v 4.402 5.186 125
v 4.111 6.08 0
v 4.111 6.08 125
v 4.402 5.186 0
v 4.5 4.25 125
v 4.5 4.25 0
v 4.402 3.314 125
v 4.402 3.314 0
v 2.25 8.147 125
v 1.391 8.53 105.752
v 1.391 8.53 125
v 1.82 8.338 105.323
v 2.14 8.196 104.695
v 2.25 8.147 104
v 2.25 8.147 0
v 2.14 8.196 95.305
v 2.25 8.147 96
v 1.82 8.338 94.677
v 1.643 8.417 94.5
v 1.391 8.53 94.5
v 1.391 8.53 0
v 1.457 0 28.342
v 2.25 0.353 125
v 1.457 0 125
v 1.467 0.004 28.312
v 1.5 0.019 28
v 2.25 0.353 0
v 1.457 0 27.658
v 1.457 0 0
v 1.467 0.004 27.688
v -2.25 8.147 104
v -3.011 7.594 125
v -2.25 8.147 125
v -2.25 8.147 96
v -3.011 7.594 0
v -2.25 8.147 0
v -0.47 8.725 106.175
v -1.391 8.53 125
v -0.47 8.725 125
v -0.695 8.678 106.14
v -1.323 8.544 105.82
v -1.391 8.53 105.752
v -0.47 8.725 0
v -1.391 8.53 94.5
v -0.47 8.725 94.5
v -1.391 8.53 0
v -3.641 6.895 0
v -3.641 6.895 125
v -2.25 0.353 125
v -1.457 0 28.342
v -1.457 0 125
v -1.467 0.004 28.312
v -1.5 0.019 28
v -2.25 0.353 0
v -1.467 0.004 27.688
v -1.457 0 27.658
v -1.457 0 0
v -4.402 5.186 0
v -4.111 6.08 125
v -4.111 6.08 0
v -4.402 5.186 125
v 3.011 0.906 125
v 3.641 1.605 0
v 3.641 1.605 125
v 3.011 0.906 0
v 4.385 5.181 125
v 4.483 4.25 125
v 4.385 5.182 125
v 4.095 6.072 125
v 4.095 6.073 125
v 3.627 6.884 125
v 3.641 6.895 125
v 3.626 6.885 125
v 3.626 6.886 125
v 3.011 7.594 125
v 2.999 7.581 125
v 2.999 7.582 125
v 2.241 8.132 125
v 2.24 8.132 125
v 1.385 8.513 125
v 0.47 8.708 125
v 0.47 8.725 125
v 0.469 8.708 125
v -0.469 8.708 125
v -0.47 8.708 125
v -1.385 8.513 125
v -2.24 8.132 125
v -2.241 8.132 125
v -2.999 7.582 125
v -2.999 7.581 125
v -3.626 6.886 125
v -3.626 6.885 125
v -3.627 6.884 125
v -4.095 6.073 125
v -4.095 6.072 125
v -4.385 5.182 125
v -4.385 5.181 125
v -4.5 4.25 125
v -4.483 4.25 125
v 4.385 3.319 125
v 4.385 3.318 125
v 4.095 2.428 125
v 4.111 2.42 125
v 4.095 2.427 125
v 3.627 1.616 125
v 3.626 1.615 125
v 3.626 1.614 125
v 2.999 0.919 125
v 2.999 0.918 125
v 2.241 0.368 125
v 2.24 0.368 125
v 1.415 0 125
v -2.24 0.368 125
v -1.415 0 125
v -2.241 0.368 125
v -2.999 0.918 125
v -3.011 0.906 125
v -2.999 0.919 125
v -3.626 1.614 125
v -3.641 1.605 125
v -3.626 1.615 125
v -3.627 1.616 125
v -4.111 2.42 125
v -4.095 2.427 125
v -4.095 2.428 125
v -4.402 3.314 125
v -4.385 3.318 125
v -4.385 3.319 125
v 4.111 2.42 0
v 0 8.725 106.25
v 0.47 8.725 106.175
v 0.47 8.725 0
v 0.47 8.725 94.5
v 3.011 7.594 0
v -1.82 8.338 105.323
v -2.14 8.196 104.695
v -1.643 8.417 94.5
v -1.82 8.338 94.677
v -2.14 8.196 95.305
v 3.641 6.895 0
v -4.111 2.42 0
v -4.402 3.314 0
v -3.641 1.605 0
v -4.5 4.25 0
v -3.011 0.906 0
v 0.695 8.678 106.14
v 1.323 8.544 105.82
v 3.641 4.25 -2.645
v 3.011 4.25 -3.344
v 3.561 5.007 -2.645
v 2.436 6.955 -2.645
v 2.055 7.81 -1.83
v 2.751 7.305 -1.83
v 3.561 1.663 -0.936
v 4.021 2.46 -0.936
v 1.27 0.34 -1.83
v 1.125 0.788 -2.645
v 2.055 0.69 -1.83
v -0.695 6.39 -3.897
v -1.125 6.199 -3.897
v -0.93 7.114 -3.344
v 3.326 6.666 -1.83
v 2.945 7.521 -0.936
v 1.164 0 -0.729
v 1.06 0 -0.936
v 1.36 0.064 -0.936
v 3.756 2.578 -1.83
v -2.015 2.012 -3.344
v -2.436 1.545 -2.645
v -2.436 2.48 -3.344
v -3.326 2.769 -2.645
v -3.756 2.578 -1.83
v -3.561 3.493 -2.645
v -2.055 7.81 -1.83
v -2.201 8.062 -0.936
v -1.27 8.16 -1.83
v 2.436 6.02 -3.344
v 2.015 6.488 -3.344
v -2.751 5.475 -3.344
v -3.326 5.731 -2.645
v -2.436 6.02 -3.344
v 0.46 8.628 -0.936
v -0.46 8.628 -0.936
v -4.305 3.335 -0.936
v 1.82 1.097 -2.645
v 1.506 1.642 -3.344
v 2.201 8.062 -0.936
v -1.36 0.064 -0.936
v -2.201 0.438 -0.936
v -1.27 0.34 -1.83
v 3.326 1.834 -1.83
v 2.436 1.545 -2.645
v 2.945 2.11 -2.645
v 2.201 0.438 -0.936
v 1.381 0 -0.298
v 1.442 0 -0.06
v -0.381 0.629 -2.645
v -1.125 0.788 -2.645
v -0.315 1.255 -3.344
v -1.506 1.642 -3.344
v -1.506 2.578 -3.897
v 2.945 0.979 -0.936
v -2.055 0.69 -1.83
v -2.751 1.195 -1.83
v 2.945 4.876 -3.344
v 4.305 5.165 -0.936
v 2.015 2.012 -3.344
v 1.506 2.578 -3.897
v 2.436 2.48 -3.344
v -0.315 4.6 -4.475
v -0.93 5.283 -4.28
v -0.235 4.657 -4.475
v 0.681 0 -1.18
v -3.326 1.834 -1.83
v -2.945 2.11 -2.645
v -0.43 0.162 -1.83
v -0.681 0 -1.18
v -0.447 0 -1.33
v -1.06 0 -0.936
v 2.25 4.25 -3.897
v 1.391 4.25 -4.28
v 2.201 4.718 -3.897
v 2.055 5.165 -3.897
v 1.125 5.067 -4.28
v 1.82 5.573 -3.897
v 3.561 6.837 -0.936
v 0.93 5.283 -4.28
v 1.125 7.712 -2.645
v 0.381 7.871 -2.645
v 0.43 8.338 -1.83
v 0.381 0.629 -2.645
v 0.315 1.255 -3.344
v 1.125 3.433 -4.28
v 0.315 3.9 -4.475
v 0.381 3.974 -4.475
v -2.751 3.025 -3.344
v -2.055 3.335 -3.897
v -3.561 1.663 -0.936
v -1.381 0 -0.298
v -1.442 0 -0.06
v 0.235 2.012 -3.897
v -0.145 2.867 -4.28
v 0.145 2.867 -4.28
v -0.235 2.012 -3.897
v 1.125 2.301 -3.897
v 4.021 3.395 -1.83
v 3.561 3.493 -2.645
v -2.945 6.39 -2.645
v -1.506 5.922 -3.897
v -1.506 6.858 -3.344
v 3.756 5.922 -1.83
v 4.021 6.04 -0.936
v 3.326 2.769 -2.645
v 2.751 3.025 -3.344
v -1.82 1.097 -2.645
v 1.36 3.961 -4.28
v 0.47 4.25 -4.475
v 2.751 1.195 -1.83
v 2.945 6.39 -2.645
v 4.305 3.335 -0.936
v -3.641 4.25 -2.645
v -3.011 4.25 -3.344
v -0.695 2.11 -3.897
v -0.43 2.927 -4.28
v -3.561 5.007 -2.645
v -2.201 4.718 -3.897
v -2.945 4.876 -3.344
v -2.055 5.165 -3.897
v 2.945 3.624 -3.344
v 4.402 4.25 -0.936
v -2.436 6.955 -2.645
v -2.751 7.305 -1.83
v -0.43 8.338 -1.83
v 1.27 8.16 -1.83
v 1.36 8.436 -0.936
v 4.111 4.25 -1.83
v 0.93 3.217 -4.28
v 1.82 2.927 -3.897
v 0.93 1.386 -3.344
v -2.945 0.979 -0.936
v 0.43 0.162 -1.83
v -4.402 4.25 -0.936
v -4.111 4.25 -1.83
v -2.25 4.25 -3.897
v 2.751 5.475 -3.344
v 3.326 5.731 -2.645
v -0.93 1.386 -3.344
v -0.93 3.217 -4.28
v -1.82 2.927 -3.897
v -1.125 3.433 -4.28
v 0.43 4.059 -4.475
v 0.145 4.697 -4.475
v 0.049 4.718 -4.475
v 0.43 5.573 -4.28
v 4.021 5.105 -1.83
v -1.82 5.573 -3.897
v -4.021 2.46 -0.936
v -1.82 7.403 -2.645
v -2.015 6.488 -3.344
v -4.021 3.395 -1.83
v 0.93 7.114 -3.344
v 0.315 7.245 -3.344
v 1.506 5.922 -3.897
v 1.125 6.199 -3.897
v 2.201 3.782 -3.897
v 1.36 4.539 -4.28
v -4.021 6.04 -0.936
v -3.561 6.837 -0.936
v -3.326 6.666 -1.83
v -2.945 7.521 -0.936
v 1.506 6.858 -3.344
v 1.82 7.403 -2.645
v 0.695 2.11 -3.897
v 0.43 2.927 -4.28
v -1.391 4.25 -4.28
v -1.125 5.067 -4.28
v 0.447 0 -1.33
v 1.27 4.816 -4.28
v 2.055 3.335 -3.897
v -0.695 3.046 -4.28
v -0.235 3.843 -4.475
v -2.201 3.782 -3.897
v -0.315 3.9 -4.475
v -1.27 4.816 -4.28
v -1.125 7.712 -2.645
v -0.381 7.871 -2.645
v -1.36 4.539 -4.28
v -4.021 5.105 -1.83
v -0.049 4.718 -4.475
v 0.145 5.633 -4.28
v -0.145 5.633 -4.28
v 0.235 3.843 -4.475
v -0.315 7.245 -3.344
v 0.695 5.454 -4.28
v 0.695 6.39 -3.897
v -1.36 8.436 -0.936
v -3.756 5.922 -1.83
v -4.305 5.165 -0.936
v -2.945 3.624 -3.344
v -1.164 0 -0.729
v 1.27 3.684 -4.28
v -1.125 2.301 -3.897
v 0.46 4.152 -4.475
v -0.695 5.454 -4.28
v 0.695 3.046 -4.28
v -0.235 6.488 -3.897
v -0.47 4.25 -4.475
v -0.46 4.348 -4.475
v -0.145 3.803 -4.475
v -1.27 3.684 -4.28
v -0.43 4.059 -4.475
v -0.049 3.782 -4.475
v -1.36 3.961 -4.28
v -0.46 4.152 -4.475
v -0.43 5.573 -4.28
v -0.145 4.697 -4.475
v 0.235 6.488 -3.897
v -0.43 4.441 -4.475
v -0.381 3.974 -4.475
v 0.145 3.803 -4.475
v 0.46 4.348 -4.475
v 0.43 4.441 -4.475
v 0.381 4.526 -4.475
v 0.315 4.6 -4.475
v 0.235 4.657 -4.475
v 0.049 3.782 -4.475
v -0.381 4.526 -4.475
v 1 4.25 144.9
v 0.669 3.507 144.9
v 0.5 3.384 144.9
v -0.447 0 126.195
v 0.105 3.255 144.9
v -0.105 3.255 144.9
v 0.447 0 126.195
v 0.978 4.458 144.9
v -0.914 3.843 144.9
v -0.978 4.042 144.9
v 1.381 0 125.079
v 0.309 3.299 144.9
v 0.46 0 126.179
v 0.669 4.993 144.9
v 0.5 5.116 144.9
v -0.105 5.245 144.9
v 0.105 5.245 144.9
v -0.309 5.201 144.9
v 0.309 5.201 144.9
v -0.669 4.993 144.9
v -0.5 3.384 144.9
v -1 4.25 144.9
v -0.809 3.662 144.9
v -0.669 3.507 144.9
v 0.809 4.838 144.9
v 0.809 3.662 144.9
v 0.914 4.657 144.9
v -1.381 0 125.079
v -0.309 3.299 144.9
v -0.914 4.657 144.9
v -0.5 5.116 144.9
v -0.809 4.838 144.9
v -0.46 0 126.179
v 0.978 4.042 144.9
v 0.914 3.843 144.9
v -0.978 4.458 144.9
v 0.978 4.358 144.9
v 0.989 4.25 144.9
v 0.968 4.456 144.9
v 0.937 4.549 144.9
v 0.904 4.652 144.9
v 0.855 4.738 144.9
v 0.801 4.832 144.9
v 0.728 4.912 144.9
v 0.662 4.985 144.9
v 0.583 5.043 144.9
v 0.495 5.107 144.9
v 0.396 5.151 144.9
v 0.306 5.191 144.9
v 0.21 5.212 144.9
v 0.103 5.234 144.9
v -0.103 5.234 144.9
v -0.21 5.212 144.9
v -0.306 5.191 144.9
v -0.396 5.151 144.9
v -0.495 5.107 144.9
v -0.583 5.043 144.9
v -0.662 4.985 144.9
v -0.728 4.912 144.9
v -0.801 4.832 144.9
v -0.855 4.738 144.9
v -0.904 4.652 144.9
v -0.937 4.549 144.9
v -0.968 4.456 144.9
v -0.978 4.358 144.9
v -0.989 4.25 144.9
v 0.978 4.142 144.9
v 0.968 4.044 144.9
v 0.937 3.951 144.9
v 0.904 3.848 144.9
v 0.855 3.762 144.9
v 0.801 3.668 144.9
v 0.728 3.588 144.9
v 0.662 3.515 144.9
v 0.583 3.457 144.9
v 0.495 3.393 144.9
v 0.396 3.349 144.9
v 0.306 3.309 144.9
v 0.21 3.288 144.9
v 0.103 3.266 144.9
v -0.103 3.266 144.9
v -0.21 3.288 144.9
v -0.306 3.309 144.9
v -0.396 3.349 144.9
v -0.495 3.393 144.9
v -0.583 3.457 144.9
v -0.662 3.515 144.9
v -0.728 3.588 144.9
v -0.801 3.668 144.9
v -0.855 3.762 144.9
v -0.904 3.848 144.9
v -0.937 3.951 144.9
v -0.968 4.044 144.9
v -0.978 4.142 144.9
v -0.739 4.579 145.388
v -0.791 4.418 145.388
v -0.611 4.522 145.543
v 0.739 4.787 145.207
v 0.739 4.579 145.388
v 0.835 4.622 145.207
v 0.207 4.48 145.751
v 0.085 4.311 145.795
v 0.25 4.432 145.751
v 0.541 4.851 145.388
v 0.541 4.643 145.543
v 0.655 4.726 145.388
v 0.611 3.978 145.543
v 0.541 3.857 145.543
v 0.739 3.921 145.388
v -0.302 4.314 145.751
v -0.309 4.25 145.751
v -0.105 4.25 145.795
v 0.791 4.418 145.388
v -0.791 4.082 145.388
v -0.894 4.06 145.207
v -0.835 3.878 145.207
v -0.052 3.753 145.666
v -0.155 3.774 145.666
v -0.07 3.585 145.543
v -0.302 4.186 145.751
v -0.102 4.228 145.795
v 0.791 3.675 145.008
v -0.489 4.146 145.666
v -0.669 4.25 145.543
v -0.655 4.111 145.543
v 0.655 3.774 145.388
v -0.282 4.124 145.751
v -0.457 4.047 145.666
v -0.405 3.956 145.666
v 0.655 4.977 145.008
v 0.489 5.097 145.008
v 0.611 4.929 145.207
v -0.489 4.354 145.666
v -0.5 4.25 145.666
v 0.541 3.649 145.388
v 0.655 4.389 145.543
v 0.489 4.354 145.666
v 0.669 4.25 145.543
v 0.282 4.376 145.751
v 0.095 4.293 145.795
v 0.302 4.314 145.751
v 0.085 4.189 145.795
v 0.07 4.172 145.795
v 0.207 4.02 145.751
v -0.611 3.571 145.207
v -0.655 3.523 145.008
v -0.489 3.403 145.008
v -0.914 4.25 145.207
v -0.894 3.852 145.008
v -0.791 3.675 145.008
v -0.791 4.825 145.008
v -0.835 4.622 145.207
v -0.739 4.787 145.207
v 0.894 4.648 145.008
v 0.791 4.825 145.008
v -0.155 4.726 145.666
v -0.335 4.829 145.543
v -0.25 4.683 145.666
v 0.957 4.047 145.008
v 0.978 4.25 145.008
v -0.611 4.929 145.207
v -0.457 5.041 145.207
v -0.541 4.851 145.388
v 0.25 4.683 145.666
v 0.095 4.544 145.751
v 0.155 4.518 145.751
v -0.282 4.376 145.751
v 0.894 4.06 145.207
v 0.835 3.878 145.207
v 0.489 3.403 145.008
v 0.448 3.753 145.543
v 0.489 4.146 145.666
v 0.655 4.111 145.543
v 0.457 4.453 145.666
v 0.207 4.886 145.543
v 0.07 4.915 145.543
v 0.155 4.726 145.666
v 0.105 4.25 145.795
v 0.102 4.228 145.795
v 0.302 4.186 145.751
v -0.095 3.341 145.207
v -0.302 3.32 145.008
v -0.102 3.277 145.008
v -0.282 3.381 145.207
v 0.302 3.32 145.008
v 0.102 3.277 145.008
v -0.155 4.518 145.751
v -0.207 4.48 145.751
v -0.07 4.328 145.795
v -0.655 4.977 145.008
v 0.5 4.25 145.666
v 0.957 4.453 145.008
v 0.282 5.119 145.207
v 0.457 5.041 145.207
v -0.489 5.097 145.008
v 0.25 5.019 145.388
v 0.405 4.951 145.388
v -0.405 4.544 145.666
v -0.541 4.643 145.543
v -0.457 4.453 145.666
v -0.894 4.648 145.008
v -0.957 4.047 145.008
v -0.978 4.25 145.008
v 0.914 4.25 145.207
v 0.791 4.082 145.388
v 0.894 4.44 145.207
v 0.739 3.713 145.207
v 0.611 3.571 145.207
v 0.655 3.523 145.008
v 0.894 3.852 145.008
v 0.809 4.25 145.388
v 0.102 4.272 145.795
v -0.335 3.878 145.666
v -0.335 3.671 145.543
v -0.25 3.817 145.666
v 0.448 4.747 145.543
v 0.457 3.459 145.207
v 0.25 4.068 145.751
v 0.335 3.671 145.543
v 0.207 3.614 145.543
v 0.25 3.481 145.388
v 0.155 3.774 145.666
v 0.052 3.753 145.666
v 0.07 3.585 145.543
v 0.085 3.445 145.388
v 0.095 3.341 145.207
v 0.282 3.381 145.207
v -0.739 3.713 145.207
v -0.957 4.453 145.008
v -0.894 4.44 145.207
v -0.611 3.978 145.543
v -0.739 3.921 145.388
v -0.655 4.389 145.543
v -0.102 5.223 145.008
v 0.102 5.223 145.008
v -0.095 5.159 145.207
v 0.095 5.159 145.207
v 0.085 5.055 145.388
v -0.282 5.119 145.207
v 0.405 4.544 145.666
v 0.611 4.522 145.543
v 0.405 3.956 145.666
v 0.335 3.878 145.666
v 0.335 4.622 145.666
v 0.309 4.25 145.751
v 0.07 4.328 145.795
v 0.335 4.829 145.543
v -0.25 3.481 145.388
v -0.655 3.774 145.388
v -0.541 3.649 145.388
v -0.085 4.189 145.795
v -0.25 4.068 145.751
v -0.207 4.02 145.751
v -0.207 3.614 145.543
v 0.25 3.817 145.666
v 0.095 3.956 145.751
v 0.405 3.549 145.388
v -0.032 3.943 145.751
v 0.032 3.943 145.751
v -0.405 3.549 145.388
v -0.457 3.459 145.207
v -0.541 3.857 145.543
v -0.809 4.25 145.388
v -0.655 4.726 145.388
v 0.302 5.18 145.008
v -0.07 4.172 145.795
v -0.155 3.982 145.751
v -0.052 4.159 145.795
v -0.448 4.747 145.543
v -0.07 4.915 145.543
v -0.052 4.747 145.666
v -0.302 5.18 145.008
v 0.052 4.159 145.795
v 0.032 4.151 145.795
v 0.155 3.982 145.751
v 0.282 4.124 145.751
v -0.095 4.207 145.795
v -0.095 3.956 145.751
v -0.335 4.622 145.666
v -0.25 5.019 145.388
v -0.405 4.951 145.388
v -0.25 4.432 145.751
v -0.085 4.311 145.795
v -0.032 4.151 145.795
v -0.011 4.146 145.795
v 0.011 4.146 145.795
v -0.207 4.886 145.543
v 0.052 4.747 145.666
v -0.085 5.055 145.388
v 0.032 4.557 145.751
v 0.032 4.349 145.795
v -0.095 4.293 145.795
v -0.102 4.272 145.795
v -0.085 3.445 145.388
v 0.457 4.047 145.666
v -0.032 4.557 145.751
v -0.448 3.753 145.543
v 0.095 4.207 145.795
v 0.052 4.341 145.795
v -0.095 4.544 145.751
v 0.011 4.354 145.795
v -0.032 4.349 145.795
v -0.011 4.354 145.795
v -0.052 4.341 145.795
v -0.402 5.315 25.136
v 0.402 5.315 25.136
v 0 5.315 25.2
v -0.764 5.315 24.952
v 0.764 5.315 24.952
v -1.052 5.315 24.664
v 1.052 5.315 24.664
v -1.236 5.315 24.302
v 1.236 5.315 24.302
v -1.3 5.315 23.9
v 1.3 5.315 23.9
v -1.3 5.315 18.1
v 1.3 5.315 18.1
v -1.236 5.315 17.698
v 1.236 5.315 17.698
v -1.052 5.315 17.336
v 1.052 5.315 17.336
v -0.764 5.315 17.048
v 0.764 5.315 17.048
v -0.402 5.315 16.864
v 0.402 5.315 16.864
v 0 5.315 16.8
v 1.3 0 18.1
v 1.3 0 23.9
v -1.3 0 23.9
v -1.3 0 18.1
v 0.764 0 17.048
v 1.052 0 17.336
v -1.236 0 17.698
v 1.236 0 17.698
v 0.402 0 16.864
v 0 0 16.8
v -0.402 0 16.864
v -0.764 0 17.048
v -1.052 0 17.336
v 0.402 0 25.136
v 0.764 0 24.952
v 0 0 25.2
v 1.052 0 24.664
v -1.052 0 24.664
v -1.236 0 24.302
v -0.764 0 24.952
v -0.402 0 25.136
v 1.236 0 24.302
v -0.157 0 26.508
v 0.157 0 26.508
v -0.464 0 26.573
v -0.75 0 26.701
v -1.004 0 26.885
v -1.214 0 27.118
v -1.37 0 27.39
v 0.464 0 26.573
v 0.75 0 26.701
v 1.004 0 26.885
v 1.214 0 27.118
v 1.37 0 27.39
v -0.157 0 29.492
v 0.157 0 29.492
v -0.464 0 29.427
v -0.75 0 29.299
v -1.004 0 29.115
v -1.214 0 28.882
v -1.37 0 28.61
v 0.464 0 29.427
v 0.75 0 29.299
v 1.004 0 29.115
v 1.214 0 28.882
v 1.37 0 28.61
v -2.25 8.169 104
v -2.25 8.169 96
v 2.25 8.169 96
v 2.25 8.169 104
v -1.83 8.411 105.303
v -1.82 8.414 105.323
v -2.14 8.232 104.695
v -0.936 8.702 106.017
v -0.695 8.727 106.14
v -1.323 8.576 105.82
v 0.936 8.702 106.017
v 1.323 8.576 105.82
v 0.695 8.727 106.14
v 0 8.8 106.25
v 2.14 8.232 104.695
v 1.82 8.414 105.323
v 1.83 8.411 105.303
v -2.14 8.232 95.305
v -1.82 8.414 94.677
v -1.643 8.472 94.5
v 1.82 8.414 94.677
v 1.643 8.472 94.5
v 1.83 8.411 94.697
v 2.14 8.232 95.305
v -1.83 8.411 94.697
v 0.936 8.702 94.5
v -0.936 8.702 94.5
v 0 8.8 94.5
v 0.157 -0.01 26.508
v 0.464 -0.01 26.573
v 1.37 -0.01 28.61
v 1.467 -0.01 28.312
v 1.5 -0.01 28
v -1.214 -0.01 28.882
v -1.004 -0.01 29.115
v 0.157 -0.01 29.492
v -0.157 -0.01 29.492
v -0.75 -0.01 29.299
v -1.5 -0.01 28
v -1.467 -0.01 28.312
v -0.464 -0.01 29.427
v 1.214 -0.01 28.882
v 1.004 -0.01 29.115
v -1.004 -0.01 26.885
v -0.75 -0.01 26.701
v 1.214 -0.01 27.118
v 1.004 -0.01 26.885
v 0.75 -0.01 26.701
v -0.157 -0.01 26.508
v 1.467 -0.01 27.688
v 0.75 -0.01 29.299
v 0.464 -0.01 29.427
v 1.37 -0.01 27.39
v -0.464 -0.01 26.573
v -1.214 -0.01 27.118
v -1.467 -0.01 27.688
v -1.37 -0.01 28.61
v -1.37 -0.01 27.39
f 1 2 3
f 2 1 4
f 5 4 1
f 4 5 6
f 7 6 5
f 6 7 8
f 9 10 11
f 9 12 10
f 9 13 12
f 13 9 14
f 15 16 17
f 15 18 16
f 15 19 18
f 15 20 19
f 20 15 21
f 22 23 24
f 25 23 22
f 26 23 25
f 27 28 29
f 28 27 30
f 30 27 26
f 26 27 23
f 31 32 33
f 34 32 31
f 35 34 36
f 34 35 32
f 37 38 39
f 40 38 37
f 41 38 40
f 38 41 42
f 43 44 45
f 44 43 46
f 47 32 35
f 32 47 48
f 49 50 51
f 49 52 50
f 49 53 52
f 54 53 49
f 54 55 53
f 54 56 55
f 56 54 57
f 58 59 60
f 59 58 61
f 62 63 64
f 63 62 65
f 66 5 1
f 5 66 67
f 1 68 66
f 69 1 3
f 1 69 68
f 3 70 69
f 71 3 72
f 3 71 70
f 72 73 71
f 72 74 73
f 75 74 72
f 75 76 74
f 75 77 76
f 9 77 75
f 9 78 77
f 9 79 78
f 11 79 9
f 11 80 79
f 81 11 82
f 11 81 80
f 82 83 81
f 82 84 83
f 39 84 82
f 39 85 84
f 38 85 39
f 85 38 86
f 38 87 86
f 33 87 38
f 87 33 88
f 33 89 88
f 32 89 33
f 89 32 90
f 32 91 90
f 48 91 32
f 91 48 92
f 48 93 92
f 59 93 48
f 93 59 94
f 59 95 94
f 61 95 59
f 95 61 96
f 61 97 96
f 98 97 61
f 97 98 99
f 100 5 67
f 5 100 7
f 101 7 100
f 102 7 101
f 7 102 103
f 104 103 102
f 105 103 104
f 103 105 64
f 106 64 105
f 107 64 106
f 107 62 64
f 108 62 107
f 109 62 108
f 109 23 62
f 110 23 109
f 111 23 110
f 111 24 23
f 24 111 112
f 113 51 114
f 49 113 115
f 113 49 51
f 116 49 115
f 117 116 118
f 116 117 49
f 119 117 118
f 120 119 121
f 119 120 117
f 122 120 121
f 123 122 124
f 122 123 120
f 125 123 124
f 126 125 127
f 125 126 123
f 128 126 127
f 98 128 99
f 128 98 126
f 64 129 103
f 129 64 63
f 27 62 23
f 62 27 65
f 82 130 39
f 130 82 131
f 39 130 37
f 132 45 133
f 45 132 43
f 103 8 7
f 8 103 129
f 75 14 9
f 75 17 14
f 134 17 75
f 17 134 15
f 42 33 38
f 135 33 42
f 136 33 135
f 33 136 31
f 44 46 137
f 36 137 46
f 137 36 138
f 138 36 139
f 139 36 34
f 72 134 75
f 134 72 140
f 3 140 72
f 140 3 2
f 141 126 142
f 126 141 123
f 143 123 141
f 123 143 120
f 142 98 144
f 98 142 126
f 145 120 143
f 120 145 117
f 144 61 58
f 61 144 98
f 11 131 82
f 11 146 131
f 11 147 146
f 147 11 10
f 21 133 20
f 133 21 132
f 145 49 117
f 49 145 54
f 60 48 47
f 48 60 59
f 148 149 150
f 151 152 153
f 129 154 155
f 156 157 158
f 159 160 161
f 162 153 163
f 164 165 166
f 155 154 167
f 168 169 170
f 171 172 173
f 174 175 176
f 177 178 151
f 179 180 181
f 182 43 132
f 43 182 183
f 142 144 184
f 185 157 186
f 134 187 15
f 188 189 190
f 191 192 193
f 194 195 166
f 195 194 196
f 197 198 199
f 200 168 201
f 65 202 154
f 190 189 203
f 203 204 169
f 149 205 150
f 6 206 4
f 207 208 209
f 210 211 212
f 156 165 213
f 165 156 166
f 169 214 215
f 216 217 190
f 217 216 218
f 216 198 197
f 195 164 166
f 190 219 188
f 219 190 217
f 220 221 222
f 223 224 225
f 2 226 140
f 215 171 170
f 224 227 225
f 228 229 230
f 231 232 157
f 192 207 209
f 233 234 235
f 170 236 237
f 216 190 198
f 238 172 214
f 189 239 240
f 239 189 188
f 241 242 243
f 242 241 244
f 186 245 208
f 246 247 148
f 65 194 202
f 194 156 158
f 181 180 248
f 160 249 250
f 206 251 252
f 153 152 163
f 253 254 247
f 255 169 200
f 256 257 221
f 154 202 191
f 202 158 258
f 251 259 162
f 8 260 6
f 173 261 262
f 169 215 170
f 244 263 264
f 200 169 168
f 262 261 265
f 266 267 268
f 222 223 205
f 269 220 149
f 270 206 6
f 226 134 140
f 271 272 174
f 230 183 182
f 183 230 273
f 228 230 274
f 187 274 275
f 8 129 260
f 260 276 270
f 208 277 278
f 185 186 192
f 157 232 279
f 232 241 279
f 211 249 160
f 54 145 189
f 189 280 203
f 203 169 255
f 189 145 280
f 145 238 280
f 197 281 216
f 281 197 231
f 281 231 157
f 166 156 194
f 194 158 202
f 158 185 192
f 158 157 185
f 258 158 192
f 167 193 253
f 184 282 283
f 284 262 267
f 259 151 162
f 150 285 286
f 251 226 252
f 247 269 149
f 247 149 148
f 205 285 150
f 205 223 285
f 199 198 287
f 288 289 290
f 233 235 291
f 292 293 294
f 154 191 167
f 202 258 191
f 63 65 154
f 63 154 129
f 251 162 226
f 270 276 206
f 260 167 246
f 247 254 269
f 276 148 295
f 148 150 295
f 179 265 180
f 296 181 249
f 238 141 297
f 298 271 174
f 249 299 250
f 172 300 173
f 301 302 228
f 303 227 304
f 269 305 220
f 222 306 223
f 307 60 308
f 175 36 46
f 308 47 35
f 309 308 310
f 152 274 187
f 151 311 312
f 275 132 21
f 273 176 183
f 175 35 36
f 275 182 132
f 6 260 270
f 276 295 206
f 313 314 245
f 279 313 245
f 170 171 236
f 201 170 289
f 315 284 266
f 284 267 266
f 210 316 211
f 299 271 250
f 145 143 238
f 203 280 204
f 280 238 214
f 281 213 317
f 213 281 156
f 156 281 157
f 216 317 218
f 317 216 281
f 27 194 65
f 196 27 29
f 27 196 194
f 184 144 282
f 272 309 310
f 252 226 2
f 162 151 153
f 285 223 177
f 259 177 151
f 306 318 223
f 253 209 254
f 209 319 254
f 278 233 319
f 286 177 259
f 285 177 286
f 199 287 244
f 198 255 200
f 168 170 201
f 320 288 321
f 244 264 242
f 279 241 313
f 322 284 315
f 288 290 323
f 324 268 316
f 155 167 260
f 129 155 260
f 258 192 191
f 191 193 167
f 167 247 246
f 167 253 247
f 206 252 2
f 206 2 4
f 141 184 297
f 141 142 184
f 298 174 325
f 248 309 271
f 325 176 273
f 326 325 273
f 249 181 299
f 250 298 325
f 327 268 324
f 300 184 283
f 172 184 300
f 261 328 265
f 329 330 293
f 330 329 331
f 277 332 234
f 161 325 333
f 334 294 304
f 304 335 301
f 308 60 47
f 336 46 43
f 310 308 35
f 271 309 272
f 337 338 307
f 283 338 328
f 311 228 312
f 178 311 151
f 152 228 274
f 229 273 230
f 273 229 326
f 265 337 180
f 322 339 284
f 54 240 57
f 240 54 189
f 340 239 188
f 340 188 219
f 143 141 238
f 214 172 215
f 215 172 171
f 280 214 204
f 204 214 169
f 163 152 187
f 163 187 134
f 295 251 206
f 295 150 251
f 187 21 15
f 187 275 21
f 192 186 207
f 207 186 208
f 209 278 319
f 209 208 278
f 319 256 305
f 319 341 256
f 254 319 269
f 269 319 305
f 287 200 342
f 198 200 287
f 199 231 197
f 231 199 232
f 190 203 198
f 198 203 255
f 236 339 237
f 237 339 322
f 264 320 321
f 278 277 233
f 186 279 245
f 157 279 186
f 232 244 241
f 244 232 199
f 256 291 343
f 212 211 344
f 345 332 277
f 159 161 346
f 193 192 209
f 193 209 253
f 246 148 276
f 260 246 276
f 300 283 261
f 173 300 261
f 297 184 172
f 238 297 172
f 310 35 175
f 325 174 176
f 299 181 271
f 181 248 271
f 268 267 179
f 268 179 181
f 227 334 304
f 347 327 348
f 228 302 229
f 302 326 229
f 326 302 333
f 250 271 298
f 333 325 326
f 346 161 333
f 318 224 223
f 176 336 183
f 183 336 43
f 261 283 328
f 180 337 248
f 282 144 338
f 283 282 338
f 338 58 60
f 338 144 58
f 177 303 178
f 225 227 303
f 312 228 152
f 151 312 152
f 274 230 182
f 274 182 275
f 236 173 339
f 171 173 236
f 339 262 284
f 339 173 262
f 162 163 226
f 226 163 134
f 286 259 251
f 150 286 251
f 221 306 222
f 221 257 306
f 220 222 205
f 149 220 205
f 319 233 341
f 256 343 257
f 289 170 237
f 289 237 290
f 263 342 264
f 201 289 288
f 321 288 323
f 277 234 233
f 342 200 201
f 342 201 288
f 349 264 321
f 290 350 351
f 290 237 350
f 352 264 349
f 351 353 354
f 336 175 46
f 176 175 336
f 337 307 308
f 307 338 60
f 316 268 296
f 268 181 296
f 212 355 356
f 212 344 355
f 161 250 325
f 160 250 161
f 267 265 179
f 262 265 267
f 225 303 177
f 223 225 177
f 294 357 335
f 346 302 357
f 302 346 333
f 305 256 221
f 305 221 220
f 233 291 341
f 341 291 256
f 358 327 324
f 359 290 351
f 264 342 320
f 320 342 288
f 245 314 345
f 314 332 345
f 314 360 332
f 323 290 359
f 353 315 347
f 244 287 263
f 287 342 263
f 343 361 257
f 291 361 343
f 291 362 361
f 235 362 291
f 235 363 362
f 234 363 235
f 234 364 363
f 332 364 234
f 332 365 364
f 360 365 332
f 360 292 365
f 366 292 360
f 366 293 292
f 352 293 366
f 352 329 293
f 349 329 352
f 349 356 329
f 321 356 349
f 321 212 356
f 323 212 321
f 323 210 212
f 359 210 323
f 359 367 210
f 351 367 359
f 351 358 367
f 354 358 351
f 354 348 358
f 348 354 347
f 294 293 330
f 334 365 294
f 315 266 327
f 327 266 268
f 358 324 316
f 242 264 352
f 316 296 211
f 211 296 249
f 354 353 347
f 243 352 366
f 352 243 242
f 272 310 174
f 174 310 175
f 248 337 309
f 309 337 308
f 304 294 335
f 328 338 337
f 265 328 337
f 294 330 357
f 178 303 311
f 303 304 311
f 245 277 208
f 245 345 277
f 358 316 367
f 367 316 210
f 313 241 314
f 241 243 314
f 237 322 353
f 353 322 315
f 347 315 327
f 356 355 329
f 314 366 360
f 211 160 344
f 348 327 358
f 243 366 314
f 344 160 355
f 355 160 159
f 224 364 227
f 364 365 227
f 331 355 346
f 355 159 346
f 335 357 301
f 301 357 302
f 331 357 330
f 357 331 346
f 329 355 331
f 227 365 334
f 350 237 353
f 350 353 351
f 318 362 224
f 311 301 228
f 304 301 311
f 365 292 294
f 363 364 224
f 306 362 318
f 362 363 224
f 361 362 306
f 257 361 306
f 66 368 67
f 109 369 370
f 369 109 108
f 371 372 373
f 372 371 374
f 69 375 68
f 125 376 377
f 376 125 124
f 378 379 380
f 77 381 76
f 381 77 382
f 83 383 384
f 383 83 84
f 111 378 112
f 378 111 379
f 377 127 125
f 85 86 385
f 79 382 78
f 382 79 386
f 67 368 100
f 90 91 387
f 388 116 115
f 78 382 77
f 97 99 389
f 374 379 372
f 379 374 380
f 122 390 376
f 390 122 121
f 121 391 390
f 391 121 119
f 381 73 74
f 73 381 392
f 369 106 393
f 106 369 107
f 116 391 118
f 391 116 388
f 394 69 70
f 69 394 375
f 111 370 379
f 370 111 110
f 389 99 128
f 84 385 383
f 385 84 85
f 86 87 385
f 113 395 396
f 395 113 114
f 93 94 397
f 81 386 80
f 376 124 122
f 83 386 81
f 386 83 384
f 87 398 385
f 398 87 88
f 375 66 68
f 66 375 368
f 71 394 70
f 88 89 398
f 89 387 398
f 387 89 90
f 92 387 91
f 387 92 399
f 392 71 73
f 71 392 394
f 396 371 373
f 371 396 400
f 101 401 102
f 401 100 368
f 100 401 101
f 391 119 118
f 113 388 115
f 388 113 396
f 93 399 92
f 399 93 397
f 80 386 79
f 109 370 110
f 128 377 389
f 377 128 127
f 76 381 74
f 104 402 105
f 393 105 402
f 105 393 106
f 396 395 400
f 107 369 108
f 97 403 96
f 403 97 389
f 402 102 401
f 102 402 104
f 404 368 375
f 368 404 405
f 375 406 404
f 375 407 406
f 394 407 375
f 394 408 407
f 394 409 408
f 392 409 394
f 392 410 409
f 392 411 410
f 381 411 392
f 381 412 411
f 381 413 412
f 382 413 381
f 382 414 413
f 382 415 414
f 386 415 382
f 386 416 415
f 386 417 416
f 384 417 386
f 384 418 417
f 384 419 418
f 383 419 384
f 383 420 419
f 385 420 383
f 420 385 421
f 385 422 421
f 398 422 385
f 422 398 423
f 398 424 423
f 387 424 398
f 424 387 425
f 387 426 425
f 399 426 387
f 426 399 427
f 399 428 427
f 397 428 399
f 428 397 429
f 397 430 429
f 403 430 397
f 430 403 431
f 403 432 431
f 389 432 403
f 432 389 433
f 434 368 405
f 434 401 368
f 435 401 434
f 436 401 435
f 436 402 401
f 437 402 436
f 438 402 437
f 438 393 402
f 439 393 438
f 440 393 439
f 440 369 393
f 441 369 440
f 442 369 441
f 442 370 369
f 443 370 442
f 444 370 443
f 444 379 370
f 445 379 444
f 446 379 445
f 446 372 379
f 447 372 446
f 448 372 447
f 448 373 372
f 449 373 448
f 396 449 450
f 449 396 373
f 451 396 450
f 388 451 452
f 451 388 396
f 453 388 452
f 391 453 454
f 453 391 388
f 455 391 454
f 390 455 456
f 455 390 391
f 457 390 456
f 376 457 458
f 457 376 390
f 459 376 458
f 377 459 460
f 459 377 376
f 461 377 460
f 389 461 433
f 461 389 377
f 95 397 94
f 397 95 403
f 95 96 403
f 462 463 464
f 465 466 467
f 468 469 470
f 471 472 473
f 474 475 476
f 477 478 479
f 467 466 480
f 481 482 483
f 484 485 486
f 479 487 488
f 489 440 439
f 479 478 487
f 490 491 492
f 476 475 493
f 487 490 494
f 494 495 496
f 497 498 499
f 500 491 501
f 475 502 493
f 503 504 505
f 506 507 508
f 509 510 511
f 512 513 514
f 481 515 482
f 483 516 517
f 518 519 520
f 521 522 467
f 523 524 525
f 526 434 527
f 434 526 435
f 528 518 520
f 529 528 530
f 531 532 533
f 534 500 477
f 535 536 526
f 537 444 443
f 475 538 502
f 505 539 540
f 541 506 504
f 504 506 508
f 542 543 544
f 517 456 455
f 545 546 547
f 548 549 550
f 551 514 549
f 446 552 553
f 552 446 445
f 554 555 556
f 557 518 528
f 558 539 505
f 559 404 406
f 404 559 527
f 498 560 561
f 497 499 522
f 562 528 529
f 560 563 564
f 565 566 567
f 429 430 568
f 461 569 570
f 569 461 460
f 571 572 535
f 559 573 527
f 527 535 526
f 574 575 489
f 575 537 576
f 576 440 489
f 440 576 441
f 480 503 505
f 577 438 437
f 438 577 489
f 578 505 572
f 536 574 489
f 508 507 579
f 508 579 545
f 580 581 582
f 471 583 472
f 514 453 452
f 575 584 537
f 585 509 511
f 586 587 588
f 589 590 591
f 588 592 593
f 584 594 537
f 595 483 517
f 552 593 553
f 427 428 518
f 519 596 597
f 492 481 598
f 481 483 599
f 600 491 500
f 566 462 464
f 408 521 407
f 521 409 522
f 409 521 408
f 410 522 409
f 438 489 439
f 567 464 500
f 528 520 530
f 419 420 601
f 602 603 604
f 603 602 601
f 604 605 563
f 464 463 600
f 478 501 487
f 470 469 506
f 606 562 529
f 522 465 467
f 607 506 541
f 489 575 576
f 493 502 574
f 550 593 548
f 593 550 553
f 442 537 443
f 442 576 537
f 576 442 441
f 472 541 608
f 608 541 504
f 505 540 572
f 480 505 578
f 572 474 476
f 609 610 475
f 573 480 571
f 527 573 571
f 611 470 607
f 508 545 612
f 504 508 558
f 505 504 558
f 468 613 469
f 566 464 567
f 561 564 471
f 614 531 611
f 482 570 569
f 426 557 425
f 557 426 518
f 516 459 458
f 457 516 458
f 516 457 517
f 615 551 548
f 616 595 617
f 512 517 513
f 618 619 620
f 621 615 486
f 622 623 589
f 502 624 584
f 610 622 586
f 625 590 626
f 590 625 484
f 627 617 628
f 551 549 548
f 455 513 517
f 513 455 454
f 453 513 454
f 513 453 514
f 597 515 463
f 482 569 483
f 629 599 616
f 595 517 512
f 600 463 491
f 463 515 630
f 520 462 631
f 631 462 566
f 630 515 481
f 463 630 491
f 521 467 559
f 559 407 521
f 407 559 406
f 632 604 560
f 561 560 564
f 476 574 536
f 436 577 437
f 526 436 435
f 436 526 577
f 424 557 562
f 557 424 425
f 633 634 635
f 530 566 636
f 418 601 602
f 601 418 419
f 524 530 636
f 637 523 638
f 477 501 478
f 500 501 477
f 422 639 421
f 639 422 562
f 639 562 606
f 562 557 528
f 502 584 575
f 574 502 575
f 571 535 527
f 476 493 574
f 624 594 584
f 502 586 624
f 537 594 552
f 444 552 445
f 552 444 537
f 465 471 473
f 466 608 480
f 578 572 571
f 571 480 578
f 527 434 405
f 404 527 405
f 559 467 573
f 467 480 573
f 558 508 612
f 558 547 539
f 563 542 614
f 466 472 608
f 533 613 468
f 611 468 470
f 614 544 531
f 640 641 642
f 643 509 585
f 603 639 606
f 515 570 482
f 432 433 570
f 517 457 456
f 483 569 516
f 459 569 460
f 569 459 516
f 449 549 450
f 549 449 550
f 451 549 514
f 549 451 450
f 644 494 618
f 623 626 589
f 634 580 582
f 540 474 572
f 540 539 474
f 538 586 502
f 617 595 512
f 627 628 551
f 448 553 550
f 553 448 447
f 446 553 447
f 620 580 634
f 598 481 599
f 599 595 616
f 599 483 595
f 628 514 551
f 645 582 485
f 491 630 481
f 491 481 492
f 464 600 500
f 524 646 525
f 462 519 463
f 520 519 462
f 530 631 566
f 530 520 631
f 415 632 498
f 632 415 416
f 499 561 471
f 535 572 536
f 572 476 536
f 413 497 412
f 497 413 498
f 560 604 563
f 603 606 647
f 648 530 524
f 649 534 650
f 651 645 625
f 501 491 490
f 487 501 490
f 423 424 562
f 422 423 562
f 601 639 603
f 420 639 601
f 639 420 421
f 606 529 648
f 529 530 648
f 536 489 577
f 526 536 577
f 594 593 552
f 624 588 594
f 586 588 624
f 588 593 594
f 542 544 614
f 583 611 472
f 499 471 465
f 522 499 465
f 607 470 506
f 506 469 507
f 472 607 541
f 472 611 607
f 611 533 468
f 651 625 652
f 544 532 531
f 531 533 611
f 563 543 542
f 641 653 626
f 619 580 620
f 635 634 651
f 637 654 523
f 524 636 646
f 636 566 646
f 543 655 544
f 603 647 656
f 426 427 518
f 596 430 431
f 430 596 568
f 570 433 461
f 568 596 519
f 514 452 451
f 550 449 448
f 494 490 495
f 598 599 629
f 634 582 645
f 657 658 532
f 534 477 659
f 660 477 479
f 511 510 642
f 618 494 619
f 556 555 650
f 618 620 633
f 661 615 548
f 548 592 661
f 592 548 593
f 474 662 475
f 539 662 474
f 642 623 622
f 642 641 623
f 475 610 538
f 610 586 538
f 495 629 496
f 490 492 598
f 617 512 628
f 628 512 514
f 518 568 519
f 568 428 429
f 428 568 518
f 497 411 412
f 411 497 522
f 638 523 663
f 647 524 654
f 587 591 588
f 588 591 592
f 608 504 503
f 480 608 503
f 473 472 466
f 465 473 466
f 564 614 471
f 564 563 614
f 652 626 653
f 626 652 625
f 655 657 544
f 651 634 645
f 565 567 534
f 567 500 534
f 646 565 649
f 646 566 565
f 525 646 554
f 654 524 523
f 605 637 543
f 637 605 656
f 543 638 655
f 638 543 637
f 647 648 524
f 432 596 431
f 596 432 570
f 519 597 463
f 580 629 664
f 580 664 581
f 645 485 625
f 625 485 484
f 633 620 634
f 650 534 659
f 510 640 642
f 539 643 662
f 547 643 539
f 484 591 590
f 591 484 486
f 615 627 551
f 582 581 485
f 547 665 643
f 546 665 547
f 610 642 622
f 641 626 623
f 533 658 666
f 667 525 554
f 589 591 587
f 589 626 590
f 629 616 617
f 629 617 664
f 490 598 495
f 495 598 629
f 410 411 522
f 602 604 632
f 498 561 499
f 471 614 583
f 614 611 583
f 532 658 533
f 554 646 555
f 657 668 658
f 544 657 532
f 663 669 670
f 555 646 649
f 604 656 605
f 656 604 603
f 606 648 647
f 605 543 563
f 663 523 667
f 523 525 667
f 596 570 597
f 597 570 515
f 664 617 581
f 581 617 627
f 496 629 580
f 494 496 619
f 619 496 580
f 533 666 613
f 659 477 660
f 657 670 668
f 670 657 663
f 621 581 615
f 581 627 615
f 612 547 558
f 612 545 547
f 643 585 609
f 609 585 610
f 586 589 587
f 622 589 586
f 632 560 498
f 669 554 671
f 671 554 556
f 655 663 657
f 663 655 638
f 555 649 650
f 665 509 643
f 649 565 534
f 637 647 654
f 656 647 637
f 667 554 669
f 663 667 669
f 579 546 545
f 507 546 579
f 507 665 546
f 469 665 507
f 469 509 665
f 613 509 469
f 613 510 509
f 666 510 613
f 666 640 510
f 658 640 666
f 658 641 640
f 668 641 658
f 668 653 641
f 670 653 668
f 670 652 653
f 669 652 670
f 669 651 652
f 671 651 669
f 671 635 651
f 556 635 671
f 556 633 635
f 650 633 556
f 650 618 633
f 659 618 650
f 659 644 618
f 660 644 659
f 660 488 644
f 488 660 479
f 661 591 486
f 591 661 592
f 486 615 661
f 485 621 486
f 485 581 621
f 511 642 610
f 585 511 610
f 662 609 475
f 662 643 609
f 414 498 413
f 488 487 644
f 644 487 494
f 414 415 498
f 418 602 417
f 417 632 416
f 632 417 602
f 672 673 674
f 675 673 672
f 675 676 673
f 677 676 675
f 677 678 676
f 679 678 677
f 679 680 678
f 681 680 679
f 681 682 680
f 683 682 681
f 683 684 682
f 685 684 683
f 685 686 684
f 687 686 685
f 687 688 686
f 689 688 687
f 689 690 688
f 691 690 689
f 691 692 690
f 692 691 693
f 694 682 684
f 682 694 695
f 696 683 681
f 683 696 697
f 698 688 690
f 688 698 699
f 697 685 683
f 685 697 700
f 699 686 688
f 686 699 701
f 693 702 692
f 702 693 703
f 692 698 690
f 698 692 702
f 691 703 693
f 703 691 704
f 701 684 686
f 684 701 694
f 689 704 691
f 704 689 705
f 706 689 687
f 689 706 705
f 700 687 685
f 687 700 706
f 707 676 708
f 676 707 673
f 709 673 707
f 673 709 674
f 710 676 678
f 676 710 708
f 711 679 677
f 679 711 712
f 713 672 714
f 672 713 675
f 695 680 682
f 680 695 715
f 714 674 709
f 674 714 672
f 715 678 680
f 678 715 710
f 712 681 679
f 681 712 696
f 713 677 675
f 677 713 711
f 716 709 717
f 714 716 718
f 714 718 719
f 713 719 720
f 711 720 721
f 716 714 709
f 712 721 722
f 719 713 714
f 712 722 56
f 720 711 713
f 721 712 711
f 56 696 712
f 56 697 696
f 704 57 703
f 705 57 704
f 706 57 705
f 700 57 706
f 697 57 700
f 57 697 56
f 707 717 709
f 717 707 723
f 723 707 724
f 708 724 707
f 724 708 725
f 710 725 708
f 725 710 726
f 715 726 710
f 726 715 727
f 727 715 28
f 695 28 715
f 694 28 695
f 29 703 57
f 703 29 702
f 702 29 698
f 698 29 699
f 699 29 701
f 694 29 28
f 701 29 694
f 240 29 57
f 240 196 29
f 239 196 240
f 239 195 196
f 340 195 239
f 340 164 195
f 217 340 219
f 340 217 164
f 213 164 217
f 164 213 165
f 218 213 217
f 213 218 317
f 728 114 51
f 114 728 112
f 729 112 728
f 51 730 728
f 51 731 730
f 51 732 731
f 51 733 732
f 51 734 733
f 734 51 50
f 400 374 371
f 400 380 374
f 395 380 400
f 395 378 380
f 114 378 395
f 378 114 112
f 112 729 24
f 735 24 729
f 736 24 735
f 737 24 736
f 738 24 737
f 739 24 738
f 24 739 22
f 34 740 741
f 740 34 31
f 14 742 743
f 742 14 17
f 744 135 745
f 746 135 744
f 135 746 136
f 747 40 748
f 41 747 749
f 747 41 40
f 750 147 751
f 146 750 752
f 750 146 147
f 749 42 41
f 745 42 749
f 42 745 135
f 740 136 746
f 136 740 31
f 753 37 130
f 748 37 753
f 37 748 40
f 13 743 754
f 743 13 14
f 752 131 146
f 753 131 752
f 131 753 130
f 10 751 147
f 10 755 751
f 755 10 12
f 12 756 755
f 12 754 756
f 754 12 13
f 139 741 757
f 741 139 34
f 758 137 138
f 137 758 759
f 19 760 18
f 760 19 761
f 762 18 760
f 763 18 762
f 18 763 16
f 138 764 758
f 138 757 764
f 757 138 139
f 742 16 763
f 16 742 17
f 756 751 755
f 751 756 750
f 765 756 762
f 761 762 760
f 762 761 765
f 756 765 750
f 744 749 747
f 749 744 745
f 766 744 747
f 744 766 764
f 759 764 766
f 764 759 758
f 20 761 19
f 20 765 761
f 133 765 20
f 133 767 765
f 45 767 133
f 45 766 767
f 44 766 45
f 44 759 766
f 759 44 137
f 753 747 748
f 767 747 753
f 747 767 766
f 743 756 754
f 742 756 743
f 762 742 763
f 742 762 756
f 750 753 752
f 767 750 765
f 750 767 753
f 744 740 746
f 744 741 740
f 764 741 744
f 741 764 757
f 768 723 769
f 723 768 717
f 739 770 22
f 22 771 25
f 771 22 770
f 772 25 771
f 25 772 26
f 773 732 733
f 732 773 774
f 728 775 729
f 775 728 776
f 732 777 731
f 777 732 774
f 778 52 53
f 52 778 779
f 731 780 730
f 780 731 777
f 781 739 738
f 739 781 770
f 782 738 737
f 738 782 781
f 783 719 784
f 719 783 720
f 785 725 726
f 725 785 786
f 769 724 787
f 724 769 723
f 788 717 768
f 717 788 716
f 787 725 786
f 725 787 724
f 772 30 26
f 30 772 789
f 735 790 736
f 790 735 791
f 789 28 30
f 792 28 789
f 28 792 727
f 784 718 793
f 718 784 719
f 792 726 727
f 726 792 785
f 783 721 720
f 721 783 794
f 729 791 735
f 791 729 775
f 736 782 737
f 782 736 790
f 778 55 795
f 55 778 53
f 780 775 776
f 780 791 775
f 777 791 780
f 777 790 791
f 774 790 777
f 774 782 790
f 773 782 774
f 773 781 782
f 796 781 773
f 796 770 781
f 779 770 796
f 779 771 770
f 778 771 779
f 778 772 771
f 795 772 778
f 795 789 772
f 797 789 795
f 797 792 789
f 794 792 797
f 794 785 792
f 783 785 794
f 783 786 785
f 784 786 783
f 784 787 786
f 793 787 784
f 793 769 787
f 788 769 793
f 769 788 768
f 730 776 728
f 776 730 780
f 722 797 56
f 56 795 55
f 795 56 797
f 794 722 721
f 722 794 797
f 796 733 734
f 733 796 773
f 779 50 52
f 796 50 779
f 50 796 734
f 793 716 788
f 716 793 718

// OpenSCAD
// file: acessories.scad
module usb_c(mask = 0)
{
  //usb c USB-C port measuring 8.4 millimetres (0.33 in) wide, 2.6 millimetres (0.10 in) high, and 6.65 millimetres (0.262 in) deep.
  rotate([90,0,90])
    translate([0,0,-6.65/2])
    round_square(w=8.4,h=2.6,l=6.65+mask);
}
module round_square(w,h,l)
{
  ws = (w-h)/2;
  translate([0,0,l/2]) cube([w-h,h,l],center=true);
  translate([-ws,0,0]) cylinder(d=h,h=l, $fn=20);
  translate([ws,0,0]) cylinder(d=h,h=l, $fn=20);
}

module fillet(r, h, center = true) 
{
  disp = (center)?r/2:0;

  translate([disp, disp, 0])

    difference() 
    {
      cube([r + 0.01, r + 0.01, h], center = true);

      translate([r/2, r/2, -0.01])
	cylinder(r = r, h = h + 2, center = true, $fn=100);

    }
}

module fillet2D(r, h, center = true) 
{
  translate([disp, disp, 0])

    difference() {
      square([r + 0.01, r + 0.01], center = true);

      translate([r/2, r/2, 0])
	circle(r = r, $fn=100);

    }
}
// main file
use <acessories.scad>
pencil();

module pencil(mask = 0)
{
  difference()
  {
    translate([0,(8.5+mask)/2,0])
    {
      cylinder(d=9+mask, h = 125, $fn =30);
      sphere(d=9+mask, $fn =30);
      translate([0,0,125-.1])
	cylinder(d1=9+mask, d2 = 2+mask,h = 20, $fn =30);
      translate([0,0,145-.2])
	sphere(d=2+mask, $fn =30);
    }
    union()
    {
      translate([-5,-2,-10]) cube([10,2,150]);
      translate([00,1.99,21])
	rotate([90,0,90])
	color("black")
	usb_c();
    }
  }
  translate([0,1.99,28])
    rotate([90,0,0])
    color("grey")
    cylinder(d=3, h = 2, $fn =30);
  translate([0,3.8,100])
    rotate([00,90,90])
    color("black")
    intersection()
    {
      round_square(w=12.5,h=4.5,l=5);
      translate([-7.5,0,0.50])
	rotate([00,90,0])
	cylinder(d=9,h=13, $fn=30);
    }
}
